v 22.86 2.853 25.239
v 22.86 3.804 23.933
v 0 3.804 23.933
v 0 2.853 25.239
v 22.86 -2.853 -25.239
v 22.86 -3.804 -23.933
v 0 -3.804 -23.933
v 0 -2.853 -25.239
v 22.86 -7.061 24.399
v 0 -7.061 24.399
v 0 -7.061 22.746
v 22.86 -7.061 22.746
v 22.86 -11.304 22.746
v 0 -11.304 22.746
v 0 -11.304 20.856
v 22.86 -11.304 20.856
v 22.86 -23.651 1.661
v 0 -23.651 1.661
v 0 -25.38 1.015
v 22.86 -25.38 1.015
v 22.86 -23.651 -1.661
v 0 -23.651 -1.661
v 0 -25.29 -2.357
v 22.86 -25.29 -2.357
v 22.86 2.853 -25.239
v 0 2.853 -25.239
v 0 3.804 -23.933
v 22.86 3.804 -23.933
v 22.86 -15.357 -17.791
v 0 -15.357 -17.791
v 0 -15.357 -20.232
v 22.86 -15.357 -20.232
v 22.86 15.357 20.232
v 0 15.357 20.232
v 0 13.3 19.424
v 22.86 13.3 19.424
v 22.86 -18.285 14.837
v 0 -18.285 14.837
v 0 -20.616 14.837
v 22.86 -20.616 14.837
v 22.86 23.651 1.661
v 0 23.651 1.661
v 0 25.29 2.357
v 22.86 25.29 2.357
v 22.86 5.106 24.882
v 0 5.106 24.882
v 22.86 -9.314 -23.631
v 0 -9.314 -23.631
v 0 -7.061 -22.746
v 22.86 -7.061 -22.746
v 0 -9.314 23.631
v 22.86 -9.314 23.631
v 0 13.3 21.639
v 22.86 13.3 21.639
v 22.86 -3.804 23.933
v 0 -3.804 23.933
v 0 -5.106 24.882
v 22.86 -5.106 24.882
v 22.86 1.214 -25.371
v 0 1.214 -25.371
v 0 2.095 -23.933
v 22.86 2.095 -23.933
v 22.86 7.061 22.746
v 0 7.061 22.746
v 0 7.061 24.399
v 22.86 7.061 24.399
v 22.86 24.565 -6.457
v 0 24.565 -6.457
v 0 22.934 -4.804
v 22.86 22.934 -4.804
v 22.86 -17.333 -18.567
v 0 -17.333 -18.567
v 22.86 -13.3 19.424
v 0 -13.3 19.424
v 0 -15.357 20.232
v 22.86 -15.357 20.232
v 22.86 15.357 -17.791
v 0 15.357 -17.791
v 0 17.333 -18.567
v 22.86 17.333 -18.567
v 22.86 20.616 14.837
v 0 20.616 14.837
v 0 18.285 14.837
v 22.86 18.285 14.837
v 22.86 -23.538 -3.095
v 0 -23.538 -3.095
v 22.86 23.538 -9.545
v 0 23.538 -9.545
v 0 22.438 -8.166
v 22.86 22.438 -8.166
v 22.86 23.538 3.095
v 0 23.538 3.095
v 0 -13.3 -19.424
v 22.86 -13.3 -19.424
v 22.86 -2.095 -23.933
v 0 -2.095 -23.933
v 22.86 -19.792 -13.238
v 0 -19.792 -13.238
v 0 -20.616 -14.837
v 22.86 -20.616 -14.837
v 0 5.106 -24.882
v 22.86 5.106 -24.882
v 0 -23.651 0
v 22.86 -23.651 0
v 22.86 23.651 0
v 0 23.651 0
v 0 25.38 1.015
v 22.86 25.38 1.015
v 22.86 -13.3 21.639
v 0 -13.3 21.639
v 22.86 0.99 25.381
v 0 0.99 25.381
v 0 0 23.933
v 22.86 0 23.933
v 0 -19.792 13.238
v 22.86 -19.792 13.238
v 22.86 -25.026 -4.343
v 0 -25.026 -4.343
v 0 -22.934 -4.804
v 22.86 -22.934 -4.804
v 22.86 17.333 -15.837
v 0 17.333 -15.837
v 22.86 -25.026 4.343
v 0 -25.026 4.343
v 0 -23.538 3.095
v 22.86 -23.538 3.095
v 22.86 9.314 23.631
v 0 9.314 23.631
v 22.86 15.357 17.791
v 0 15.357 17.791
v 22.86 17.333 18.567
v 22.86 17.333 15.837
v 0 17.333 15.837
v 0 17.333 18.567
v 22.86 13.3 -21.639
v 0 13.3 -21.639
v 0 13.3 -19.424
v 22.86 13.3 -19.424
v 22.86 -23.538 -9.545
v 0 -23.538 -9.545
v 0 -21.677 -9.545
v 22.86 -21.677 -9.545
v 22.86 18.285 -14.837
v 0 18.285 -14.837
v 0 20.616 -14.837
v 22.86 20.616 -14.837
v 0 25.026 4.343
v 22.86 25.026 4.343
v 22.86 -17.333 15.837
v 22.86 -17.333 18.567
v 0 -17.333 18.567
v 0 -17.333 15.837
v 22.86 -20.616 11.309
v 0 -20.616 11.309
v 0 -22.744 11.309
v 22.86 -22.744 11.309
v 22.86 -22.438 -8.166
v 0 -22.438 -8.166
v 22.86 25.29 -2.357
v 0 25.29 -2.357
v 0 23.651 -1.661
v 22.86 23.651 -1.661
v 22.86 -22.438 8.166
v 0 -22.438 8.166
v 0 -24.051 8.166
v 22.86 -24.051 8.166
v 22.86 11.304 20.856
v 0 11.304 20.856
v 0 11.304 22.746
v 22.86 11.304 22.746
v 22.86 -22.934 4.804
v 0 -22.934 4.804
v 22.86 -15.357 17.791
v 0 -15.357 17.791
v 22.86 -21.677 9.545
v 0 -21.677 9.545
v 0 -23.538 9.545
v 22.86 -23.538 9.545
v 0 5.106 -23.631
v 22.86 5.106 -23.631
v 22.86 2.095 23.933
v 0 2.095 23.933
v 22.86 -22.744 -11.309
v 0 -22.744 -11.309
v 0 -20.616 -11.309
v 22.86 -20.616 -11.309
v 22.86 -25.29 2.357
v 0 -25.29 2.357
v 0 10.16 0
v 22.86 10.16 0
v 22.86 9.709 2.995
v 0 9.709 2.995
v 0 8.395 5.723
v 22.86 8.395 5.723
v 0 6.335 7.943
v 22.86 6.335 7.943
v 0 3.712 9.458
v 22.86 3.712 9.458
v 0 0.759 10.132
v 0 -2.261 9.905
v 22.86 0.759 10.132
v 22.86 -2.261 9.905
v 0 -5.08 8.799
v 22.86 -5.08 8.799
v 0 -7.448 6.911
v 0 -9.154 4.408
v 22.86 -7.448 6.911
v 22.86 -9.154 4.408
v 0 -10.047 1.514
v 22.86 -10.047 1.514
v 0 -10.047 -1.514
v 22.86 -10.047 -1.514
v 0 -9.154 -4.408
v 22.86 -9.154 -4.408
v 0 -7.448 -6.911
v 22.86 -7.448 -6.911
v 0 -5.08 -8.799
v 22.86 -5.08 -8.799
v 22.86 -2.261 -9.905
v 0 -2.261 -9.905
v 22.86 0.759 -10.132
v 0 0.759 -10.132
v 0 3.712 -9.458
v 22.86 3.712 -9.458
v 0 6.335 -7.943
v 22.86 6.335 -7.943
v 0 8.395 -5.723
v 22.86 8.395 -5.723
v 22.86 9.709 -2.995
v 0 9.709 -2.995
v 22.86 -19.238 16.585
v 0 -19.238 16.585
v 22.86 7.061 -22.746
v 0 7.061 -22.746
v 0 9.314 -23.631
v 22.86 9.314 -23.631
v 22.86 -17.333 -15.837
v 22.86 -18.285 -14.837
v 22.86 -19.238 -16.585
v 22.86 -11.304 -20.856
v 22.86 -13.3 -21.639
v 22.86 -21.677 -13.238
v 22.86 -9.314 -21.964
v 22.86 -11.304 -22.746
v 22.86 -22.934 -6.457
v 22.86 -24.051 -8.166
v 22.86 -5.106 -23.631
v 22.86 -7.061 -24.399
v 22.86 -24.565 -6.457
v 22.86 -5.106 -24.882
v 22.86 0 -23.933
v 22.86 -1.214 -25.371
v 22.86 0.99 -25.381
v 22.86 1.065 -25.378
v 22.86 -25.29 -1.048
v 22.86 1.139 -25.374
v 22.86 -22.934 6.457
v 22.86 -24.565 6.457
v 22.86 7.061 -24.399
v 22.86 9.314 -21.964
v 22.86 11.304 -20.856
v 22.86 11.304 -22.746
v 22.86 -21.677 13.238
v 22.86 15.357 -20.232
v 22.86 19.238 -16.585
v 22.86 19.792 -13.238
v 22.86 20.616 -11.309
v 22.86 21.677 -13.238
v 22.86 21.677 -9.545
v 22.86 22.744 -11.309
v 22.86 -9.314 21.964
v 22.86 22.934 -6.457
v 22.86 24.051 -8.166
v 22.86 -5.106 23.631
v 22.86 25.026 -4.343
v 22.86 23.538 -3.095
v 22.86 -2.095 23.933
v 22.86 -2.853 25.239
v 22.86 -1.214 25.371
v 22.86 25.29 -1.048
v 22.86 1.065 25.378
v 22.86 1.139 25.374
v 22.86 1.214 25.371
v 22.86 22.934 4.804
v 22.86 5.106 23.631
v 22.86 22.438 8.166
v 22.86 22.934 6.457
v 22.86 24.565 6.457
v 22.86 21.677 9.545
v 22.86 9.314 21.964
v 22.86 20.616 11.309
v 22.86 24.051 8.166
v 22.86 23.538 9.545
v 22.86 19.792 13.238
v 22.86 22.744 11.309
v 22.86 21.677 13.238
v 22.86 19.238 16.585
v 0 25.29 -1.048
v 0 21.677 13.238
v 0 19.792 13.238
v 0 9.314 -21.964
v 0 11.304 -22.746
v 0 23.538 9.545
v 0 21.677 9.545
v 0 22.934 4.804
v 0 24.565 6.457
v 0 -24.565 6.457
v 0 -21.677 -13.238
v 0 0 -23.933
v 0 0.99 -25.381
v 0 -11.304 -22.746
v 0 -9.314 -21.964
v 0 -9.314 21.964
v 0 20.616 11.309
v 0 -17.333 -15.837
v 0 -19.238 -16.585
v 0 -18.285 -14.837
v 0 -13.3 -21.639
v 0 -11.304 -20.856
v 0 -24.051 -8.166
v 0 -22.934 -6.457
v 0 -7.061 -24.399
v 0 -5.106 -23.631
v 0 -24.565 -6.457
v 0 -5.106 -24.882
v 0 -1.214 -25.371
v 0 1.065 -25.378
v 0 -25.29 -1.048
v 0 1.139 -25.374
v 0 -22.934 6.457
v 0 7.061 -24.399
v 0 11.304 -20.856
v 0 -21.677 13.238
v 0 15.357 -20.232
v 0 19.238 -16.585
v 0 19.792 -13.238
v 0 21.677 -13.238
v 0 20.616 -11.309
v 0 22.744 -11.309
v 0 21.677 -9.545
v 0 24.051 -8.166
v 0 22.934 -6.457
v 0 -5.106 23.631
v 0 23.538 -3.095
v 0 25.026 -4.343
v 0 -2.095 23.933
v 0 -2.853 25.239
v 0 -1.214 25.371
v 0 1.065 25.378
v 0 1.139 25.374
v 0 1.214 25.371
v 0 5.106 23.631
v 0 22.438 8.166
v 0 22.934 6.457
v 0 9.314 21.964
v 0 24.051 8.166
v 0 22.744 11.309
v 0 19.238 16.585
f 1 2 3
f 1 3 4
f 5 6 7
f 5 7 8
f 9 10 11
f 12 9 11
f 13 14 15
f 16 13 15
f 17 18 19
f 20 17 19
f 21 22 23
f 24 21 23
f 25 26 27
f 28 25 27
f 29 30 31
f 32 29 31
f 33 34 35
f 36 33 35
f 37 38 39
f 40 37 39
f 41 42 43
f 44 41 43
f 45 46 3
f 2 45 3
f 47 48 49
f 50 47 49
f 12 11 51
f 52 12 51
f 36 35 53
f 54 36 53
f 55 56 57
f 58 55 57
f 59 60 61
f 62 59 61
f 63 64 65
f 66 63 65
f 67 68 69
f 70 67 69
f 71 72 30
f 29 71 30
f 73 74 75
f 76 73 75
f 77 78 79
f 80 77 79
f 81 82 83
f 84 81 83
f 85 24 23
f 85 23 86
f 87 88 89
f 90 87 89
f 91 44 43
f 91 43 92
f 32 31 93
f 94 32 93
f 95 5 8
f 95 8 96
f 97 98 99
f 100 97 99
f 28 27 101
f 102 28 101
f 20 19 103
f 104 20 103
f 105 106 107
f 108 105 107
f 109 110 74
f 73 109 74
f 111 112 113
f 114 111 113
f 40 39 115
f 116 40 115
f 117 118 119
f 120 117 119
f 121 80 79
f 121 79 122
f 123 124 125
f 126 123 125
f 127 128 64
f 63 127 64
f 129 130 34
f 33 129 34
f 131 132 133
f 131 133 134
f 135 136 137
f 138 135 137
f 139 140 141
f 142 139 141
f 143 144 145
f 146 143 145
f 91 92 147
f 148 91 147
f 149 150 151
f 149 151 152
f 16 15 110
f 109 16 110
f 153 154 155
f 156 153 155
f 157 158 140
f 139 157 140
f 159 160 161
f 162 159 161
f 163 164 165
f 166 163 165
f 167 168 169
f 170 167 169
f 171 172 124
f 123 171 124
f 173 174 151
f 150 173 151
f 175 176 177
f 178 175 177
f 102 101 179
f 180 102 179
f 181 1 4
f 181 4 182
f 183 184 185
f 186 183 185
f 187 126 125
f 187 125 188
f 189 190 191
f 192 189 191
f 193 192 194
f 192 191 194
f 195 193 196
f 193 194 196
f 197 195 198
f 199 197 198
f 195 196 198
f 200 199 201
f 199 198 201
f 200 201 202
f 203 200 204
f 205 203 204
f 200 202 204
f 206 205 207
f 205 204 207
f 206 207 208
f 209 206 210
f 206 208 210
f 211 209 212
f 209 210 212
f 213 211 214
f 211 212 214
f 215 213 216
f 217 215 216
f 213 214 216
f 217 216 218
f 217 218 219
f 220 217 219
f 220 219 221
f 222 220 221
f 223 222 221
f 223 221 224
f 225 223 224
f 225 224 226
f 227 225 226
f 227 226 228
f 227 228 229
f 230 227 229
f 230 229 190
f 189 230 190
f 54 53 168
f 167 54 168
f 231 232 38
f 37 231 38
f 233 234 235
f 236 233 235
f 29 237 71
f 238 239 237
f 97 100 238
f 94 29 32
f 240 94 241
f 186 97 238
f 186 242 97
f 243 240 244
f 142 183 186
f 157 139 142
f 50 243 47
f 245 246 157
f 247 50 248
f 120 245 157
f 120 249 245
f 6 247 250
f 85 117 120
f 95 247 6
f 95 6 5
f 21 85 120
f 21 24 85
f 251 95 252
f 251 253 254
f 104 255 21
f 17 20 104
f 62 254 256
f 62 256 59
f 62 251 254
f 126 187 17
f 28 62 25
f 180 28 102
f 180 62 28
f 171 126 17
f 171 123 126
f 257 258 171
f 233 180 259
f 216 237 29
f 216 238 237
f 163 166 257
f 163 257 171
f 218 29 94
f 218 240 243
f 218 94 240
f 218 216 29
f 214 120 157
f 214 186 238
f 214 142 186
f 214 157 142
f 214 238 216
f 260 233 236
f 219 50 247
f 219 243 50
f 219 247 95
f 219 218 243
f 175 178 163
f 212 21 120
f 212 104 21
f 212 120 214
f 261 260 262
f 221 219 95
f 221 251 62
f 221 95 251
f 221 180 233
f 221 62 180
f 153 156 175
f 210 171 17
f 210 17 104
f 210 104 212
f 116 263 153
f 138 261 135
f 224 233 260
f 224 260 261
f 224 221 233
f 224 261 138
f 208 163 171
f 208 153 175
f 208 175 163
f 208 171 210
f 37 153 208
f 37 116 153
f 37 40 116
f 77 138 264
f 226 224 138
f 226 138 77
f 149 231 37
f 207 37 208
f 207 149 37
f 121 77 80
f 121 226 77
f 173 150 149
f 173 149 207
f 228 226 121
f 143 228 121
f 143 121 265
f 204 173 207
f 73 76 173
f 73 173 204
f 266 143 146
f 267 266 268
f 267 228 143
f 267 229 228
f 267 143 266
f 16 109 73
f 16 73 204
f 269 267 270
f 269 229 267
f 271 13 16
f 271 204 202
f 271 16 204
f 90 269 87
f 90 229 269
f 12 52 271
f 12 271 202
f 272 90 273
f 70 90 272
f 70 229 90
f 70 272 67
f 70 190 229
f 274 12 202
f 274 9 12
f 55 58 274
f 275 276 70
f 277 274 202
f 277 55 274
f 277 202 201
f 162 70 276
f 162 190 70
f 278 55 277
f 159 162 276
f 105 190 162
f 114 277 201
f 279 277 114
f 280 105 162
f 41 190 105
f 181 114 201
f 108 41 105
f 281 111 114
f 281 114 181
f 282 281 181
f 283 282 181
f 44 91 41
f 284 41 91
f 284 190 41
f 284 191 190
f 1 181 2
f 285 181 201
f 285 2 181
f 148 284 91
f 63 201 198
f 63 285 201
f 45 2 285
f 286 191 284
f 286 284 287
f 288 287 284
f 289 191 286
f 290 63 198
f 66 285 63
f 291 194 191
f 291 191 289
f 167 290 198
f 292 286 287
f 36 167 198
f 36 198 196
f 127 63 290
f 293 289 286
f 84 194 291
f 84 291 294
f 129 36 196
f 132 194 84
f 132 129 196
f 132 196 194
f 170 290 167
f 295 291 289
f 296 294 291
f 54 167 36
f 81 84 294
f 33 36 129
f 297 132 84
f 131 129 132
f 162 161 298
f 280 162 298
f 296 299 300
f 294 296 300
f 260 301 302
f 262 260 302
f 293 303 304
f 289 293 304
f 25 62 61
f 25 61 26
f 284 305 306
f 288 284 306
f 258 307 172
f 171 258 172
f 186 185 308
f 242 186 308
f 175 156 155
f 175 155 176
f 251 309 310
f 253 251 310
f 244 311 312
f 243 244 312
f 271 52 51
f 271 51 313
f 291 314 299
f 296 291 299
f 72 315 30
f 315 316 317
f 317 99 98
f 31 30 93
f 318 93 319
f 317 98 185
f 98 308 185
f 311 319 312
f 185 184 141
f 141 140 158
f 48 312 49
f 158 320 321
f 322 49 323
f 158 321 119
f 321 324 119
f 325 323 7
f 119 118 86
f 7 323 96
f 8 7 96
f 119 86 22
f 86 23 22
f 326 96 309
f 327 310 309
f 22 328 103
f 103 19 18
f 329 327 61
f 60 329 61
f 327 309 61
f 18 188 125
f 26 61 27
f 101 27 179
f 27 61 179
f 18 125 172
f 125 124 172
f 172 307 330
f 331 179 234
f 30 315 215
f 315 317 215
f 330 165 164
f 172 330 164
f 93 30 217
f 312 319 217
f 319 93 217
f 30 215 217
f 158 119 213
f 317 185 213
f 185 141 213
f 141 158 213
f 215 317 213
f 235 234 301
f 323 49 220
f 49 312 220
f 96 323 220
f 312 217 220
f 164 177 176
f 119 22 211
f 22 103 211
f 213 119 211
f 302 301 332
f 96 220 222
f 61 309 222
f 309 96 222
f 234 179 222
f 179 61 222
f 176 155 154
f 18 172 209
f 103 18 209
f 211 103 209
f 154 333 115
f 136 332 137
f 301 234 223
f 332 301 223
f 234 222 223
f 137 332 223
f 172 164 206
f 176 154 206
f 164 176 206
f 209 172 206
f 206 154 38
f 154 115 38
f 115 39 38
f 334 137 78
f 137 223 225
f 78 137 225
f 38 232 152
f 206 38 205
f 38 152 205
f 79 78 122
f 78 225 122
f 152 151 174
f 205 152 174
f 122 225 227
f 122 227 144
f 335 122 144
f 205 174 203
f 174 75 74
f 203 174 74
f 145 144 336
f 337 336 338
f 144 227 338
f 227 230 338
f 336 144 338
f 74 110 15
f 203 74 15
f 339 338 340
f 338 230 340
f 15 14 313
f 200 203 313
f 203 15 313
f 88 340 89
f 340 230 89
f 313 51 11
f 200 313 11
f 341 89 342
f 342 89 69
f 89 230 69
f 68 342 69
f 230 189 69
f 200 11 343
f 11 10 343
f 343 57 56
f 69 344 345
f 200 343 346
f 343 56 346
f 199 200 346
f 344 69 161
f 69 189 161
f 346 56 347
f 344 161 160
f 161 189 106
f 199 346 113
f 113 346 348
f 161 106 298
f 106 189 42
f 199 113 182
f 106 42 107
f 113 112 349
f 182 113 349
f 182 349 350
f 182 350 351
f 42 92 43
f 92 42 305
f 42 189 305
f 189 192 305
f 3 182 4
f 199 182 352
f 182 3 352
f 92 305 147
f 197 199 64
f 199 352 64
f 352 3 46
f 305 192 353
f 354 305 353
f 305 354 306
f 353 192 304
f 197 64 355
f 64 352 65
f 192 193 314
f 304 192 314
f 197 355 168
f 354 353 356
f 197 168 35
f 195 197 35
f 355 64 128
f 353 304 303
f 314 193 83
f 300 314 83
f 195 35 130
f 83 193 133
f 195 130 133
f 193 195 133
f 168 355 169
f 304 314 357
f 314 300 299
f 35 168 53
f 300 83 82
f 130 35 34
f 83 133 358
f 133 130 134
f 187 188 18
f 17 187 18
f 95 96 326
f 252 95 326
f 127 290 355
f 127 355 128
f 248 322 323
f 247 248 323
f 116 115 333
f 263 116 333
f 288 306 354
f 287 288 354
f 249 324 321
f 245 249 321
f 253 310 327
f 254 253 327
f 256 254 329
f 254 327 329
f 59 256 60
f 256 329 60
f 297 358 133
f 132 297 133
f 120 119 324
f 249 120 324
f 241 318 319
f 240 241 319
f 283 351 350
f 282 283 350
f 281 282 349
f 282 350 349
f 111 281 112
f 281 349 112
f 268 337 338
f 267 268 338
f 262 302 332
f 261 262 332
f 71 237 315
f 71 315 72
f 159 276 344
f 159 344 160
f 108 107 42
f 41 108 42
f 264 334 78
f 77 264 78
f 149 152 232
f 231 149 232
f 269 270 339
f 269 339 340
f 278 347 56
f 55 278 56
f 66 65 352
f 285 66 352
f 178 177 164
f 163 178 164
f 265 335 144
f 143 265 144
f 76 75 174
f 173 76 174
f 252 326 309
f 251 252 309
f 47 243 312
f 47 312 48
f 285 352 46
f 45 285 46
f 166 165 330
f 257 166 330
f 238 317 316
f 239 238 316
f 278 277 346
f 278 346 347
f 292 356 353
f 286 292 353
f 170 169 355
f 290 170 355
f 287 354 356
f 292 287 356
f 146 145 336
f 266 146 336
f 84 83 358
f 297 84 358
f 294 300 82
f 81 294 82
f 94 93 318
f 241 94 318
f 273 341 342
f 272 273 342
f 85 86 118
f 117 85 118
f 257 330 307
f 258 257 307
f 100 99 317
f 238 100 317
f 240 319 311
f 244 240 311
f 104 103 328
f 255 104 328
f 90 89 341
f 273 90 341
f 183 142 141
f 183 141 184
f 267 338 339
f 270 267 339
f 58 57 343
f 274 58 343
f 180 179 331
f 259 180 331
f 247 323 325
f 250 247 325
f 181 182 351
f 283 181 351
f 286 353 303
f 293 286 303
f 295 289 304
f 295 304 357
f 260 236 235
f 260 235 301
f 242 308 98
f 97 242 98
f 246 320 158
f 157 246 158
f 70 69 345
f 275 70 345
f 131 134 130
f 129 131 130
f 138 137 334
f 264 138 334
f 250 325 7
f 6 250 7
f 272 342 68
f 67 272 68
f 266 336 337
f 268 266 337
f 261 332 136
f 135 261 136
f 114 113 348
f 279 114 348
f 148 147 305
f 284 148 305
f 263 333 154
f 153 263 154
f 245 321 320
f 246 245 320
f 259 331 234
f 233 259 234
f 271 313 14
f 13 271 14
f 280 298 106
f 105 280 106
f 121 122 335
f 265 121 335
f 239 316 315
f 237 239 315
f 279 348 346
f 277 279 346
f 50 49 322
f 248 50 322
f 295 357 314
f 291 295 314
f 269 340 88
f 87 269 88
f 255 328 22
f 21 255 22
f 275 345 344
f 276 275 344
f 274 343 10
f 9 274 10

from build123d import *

# Parameters (mm, degrees)
F1_DEPTH = 22.86
F2_R     = 10.16
F3_DEPTH = 38.1


with BuildPart() as f1:
    # F0 (on Right) → F1 (new body)
    with BuildSketch(Plane.YZ):
        with BuildLine():
            Line((23.650777, 0), (25.379719, 1.014815))
            Line((25.379719, 1.014815), (23.650777, 1.661146))
            Line((23.650777, 1.661146), (25.290415, 2.356882))
            Line((25.290415, 2.356882), (23.538487, 3.094504))
            Line((23.538487, 3.094504), (25.025895, 4.343339))
            Line((25.025895, 4.343339), (22.934098, 4.803507))
            Line((22.934098, 4.803507), (24.565468, 6.457382))
            Line((24.565468, 6.457382), (22.934098, 6.457382))
            Line((22.934098, 6.457382), (24.051407, 8.166384))
            Line((24.051407, 8.166384), (22.437936, 8.166384))
            Line((22.437936, 8.166384), (23.538487, 9.544612))
            Line((23.538487, 9.544612), (21.677369, 9.544612))
            Line((21.677369, 9.544612), (22.743621, 11.308745))
            Line((22.743621, 11.308745), (20.61609, 11.308745))
            Line((20.61609, 11.308745), (21.677369, 13.238265))
            Line((21.677369, 13.238265), (19.791737, 13.238265))
            Line((19.791737, 13.238265), (20.61609, 14.837009))
            Line((20.61609, 14.837009), (18.285365, 14.837009))
            Line((18.285365, 14.837009), (19.237809, 16.585135))
            Line((19.237809, 16.585135), (17.33292, 15.836925))
            Line((17.33292, 15.836925), (17.33292, 18.566903))
            Line((17.33292, 18.566903), (15.356795, 17.790713))
            Line((15.356795, 17.790713), (15.356795, 20.231877))
            Line((15.356795, 20.231877), (13.300184, 19.424073))
            Line((13.300184, 19.424073), (13.300184, 21.639434))
            Line((13.300184, 21.639434), (11.304469, 20.85555))
            Line((11.304469, 20.85555), (11.304469, 22.745746))
            Line((11.304469, 22.745746), (9.314078, 21.963953))
            Line((9.314078, 21.963953), (9.314078, 23.630657))
            Line((9.314078, 23.630657), (7.061159, 22.745746))
            Line((7.061159, 22.745746), (7.061159, 24.398771))
            Line((7.061159, 24.398771), (5.105594, 23.630657))
            Line((5.105594, 23.630657), (5.105594, 24.881578))
            Line((5.105594, 24.881578), (3.804288, 23.933317))
            Line((3.804288, 23.933317), (2.852615, 25.239306))
            Line((2.852615, 25.239306), (2.095285, 23.933317))
            Line((2.095285, 23.933317), (1.213507, 25.370995))
            ThreePointArc((1.213507, 25.370995), (1.101785, 25.376093), (0.990041, 25.380698))
            Line((0.990041, 25.380698), (0, 23.933317))
            Line((0, 23.933317), (-1.213507, 25.370995))
            Line((-1.213507, 25.370995), (-2.095285, 23.933317))
            Line((-2.095285, 23.933317), (-2.852615, 25.239306))
            Line((-2.852615, 25.239306), (-3.804288, 23.933317))
            Line((-3.804288, 23.933317), (-5.105594, 24.881578))
            Line((-5.105594, 24.881578), (-5.105594, 23.630657))
            Line((-5.105594, 23.630657), (-7.061159, 24.398771))
            Line((-7.061159, 24.398771), (-7.061159, 22.745746))
            Line((-7.061159, 22.745746), (-9.314078, 23.630657))
            Line((-9.314078, 23.630657), (-9.314078, 21.963953))
            Line((-9.314078, 21.963953), (-11.304469, 22.745746))
            Line((-11.304469, 22.745746), (-11.304469, 20.85555))
            Line((-11.304469, 20.85555), (-13.300184, 21.639434))
            Line((-13.300184, 21.639434), (-13.300184, 19.424073))
            Line((-13.300184, 19.424073), (-15.356795, 20.231877))
            Line((-15.356795, 20.231877), (-15.356795, 17.790713))
            Line((-15.356795, 17.790713), (-17.33292, 18.566903))
            Line((-17.33292, 18.566903), (-17.33292, 15.836925))
            Line((-17.33292, 15.836925), (-19.237809, 16.585135))
            Line((-19.237809, 16.585135), (-18.285365, 14.837009))
            Line((-18.285365, 14.837009), (-20.61609, 14.837009))
            Line((-20.61609, 14.837009), (-19.791737, 13.238265))
            Line((-19.791737, 13.238265), (-21.677369, 13.238265))
            Line((-21.677369, 13.238265), (-20.61609, 11.308745))
            Line((-20.61609, 11.308745), (-22.743621, 11.308745))
            Line((-22.743621, 11.308745), (-21.677369, 9.544612))
            Line((-21.677369, 9.544612), (-23.538487, 9.544612))
            Line((-23.538487, 9.544612), (-22.437936, 8.166384))
            Line((-22.437936, 8.166384), (-24.051407, 8.166384))
            Line((-24.051407, 8.166384), (-22.934098, 6.457382))
            Line((-22.934098, 6.457382), (-24.565468, 6.457382))
            Line((-24.565468, 6.457382), (-22.934098, 4.803507))
            Line((-22.934098, 4.803507), (-25.025895, 4.343339))
            Line((-25.025895, 4.343339), (-23.538487, 3.094504))
            Line((-23.538487, 3.094504), (-25.290415, 2.356882))
            Line((-25.290415, 2.356882), (-23.650777, 1.661146))
            Line((-23.650777, 1.661146), (-25.379719, 1.014815))
            Line((-25.379719, 1.014815), (-23.650777, 0))
            Line((-23.650777, 0), (-25.290127, -1.048307))
            Line((-25.290127, -1.048307), (-23.650777, -1.661146))
            Line((-23.650777, -1.661146), (-25.290415, -2.356882))
            Line((-25.290415, -2.356882), (-23.538487, -3.094504))
            Line((-23.538487, -3.094504), (-25.025895, -4.343339))
            Line((-25.025895, -4.343339), (-22.934098, -4.803507))
            Line((-22.934098, -4.803507), (-24.565468, -6.457382))
            Line((-24.565468, -6.457382), (-22.934098, -6.457382))
            Line((-22.934098, -6.457382), (-24.051407, -8.166384))
            Line((-24.051407, -8.166384), (-22.437936, -8.166384))
            Line((-22.437936, -8.166384), (-23.538487, -9.544612))
            Line((-23.538487, -9.544612), (-21.677369, -9.544612))
            Line((-21.677369, -9.544612), (-22.743621, -11.308745))
            Line((-22.743621, -11.308745), (-20.61609, -11.308745))
            Line((-20.61609, -11.308745), (-21.677369, -13.238265))
            Line((-21.677369, -13.238265), (-19.791737, -13.238265))
            Line((-19.791737, -13.238265), (-20.61609, -14.837009))
            Line((-20.61609, -14.837009), (-18.285365, -14.837009))
            Line((-18.285365, -14.837009), (-19.237809, -16.585135))
            Line((-19.237809, -16.585135), (-17.33292, -15.836925))
            Line((-17.33292, -15.836925), (-17.33292, -18.566903))
            Line((-17.33292, -18.566903), (-15.356795, -17.790713))
            Line((-15.356795, -17.790713), (-15.356795, -20.231877))
            Line((-15.356795, -20.231877), (-13.300184, -19.424073))
            Line((-13.300184, -19.424073), (-13.300184, -21.639434))
            Line((-13.300184, -21.639434), (-11.304469, -20.85555))
            Line((-11.304469, -20.85555), (-11.304469, -22.745746))
            Line((-11.304469, -22.745746), (-9.314078, -21.963953))
            Line((-9.314078, -21.963953), (-9.314078, -23.630657))
            Line((-9.314078, -23.630657), (-7.061159, -22.745746))
            Line((-7.061159, -22.745746), (-7.061159, -24.398771))
            Line((-7.061159, -24.398771), (-5.105594, -23.630657))
            Line((-5.105594, -23.630657), (-5.105594, -24.881578))
            Line((-5.105594, -24.881578), (-3.804288, -23.933317))
            Line((-3.804288, -23.933317), (-2.852615, -25.239306))
            Line((-2.852615, -25.239306), (-2.095285, -23.933317))
            Line((-2.095285, -23.933317), (-1.213507, -25.370995))
            Line((-1.213507, -25.370995), (0, -23.933317))
            Line((0, -23.933317), (0.990041, -25.380698))
            ThreePointArc((0.990041, -25.380698), (1.101785, -25.376093), (1.213507, -25.370995))
            Line((1.213507, -25.370995), (2.095285, -23.933317))
            Line((2.095285, -23.933317), (2.852615, -25.239306))
            Line((2.852615, -25.239306), (3.804288, -23.933317))
            Line((3.804288, -23.933317), (5.105594, -24.881578))
            Line((5.105594, -24.881578), (5.105594, -23.630657))
            Line((5.105594, -23.630657), (7.061159, -24.398771))
            Line((7.061159, -24.398771), (7.061159, -22.745746))
            Line((7.061159, -22.745746), (9.314078, -23.630657))
            Line((9.314078, -23.630657), (9.314078, -21.963953))
            Line((9.314078, -21.963953), (11.304469, -22.745746))
            Line((11.304469, -22.745746), (11.304469, -20.85555))
            Line((11.304469, -20.85555), (13.300184, -21.639434))
            Line((13.300184, -21.639434), (13.300184, -19.424073))
            Line((13.300184, -19.424073), (15.356795, -20.231877))
            Line((15.356795, -20.231877), (15.356795, -17.790713))
            Line((15.356795, -17.790713), (17.33292, -18.566903))
            Line((17.33292, -18.566903), (17.33292, -15.836925))
            Line((17.33292, -15.836925), (19.237809, -16.585135))
            Line((19.237809, -16.585135), (18.285365, -14.837009))
            Line((18.285365, -14.837009), (20.61609, -14.837009))
            Line((20.61609, -14.837009), (19.791737, -13.238265))
            Line((19.791737, -13.238265), (21.677369, -13.238265))
            Line((21.677369, -13.238265), (20.61609, -11.308745))
            Line((20.61609, -11.308745), (22.743621, -11.308745))
            Line((22.743621, -11.308745), (21.677369, -9.544612))
            Line((21.677369, -9.544612), (23.538487, -9.544612))
            Line((23.538487, -9.544612), (22.437936, -8.166384))
            Line((22.437936, -8.166384), (24.051407, -8.166384))
            Line((24.051407, -8.166384), (22.934098, -6.457382))
            Line((22.934098, -6.457382), (24.565468, -6.457382))
            Line((24.565468, -6.457382), (22.934098, -4.803507))
            Line((22.934098, -4.803507), (25.025895, -4.343339))
            Line((25.025895, -4.343339), (23.538487, -3.094504))
            Line((23.538487, -3.094504), (25.290415, -2.356882))
            Line((25.290415, -2.356882), (23.650777, -1.661146))
            Line((23.650777, -1.661146), (25.290127, -1.048307))
            Line((25.290127, -1.048307), (23.650777, 0))
        make_face()
    extrude(amount=F1_DEPTH)

    # F2 (on face) → F3 (cut)
    with BuildSketch(Plane.YZ.offset(22.86)):
        Circle(F2_R)
    extrude(amount=-F3_DEPTH, mode=Mode.SUBTRACT)


solid = f1.part
